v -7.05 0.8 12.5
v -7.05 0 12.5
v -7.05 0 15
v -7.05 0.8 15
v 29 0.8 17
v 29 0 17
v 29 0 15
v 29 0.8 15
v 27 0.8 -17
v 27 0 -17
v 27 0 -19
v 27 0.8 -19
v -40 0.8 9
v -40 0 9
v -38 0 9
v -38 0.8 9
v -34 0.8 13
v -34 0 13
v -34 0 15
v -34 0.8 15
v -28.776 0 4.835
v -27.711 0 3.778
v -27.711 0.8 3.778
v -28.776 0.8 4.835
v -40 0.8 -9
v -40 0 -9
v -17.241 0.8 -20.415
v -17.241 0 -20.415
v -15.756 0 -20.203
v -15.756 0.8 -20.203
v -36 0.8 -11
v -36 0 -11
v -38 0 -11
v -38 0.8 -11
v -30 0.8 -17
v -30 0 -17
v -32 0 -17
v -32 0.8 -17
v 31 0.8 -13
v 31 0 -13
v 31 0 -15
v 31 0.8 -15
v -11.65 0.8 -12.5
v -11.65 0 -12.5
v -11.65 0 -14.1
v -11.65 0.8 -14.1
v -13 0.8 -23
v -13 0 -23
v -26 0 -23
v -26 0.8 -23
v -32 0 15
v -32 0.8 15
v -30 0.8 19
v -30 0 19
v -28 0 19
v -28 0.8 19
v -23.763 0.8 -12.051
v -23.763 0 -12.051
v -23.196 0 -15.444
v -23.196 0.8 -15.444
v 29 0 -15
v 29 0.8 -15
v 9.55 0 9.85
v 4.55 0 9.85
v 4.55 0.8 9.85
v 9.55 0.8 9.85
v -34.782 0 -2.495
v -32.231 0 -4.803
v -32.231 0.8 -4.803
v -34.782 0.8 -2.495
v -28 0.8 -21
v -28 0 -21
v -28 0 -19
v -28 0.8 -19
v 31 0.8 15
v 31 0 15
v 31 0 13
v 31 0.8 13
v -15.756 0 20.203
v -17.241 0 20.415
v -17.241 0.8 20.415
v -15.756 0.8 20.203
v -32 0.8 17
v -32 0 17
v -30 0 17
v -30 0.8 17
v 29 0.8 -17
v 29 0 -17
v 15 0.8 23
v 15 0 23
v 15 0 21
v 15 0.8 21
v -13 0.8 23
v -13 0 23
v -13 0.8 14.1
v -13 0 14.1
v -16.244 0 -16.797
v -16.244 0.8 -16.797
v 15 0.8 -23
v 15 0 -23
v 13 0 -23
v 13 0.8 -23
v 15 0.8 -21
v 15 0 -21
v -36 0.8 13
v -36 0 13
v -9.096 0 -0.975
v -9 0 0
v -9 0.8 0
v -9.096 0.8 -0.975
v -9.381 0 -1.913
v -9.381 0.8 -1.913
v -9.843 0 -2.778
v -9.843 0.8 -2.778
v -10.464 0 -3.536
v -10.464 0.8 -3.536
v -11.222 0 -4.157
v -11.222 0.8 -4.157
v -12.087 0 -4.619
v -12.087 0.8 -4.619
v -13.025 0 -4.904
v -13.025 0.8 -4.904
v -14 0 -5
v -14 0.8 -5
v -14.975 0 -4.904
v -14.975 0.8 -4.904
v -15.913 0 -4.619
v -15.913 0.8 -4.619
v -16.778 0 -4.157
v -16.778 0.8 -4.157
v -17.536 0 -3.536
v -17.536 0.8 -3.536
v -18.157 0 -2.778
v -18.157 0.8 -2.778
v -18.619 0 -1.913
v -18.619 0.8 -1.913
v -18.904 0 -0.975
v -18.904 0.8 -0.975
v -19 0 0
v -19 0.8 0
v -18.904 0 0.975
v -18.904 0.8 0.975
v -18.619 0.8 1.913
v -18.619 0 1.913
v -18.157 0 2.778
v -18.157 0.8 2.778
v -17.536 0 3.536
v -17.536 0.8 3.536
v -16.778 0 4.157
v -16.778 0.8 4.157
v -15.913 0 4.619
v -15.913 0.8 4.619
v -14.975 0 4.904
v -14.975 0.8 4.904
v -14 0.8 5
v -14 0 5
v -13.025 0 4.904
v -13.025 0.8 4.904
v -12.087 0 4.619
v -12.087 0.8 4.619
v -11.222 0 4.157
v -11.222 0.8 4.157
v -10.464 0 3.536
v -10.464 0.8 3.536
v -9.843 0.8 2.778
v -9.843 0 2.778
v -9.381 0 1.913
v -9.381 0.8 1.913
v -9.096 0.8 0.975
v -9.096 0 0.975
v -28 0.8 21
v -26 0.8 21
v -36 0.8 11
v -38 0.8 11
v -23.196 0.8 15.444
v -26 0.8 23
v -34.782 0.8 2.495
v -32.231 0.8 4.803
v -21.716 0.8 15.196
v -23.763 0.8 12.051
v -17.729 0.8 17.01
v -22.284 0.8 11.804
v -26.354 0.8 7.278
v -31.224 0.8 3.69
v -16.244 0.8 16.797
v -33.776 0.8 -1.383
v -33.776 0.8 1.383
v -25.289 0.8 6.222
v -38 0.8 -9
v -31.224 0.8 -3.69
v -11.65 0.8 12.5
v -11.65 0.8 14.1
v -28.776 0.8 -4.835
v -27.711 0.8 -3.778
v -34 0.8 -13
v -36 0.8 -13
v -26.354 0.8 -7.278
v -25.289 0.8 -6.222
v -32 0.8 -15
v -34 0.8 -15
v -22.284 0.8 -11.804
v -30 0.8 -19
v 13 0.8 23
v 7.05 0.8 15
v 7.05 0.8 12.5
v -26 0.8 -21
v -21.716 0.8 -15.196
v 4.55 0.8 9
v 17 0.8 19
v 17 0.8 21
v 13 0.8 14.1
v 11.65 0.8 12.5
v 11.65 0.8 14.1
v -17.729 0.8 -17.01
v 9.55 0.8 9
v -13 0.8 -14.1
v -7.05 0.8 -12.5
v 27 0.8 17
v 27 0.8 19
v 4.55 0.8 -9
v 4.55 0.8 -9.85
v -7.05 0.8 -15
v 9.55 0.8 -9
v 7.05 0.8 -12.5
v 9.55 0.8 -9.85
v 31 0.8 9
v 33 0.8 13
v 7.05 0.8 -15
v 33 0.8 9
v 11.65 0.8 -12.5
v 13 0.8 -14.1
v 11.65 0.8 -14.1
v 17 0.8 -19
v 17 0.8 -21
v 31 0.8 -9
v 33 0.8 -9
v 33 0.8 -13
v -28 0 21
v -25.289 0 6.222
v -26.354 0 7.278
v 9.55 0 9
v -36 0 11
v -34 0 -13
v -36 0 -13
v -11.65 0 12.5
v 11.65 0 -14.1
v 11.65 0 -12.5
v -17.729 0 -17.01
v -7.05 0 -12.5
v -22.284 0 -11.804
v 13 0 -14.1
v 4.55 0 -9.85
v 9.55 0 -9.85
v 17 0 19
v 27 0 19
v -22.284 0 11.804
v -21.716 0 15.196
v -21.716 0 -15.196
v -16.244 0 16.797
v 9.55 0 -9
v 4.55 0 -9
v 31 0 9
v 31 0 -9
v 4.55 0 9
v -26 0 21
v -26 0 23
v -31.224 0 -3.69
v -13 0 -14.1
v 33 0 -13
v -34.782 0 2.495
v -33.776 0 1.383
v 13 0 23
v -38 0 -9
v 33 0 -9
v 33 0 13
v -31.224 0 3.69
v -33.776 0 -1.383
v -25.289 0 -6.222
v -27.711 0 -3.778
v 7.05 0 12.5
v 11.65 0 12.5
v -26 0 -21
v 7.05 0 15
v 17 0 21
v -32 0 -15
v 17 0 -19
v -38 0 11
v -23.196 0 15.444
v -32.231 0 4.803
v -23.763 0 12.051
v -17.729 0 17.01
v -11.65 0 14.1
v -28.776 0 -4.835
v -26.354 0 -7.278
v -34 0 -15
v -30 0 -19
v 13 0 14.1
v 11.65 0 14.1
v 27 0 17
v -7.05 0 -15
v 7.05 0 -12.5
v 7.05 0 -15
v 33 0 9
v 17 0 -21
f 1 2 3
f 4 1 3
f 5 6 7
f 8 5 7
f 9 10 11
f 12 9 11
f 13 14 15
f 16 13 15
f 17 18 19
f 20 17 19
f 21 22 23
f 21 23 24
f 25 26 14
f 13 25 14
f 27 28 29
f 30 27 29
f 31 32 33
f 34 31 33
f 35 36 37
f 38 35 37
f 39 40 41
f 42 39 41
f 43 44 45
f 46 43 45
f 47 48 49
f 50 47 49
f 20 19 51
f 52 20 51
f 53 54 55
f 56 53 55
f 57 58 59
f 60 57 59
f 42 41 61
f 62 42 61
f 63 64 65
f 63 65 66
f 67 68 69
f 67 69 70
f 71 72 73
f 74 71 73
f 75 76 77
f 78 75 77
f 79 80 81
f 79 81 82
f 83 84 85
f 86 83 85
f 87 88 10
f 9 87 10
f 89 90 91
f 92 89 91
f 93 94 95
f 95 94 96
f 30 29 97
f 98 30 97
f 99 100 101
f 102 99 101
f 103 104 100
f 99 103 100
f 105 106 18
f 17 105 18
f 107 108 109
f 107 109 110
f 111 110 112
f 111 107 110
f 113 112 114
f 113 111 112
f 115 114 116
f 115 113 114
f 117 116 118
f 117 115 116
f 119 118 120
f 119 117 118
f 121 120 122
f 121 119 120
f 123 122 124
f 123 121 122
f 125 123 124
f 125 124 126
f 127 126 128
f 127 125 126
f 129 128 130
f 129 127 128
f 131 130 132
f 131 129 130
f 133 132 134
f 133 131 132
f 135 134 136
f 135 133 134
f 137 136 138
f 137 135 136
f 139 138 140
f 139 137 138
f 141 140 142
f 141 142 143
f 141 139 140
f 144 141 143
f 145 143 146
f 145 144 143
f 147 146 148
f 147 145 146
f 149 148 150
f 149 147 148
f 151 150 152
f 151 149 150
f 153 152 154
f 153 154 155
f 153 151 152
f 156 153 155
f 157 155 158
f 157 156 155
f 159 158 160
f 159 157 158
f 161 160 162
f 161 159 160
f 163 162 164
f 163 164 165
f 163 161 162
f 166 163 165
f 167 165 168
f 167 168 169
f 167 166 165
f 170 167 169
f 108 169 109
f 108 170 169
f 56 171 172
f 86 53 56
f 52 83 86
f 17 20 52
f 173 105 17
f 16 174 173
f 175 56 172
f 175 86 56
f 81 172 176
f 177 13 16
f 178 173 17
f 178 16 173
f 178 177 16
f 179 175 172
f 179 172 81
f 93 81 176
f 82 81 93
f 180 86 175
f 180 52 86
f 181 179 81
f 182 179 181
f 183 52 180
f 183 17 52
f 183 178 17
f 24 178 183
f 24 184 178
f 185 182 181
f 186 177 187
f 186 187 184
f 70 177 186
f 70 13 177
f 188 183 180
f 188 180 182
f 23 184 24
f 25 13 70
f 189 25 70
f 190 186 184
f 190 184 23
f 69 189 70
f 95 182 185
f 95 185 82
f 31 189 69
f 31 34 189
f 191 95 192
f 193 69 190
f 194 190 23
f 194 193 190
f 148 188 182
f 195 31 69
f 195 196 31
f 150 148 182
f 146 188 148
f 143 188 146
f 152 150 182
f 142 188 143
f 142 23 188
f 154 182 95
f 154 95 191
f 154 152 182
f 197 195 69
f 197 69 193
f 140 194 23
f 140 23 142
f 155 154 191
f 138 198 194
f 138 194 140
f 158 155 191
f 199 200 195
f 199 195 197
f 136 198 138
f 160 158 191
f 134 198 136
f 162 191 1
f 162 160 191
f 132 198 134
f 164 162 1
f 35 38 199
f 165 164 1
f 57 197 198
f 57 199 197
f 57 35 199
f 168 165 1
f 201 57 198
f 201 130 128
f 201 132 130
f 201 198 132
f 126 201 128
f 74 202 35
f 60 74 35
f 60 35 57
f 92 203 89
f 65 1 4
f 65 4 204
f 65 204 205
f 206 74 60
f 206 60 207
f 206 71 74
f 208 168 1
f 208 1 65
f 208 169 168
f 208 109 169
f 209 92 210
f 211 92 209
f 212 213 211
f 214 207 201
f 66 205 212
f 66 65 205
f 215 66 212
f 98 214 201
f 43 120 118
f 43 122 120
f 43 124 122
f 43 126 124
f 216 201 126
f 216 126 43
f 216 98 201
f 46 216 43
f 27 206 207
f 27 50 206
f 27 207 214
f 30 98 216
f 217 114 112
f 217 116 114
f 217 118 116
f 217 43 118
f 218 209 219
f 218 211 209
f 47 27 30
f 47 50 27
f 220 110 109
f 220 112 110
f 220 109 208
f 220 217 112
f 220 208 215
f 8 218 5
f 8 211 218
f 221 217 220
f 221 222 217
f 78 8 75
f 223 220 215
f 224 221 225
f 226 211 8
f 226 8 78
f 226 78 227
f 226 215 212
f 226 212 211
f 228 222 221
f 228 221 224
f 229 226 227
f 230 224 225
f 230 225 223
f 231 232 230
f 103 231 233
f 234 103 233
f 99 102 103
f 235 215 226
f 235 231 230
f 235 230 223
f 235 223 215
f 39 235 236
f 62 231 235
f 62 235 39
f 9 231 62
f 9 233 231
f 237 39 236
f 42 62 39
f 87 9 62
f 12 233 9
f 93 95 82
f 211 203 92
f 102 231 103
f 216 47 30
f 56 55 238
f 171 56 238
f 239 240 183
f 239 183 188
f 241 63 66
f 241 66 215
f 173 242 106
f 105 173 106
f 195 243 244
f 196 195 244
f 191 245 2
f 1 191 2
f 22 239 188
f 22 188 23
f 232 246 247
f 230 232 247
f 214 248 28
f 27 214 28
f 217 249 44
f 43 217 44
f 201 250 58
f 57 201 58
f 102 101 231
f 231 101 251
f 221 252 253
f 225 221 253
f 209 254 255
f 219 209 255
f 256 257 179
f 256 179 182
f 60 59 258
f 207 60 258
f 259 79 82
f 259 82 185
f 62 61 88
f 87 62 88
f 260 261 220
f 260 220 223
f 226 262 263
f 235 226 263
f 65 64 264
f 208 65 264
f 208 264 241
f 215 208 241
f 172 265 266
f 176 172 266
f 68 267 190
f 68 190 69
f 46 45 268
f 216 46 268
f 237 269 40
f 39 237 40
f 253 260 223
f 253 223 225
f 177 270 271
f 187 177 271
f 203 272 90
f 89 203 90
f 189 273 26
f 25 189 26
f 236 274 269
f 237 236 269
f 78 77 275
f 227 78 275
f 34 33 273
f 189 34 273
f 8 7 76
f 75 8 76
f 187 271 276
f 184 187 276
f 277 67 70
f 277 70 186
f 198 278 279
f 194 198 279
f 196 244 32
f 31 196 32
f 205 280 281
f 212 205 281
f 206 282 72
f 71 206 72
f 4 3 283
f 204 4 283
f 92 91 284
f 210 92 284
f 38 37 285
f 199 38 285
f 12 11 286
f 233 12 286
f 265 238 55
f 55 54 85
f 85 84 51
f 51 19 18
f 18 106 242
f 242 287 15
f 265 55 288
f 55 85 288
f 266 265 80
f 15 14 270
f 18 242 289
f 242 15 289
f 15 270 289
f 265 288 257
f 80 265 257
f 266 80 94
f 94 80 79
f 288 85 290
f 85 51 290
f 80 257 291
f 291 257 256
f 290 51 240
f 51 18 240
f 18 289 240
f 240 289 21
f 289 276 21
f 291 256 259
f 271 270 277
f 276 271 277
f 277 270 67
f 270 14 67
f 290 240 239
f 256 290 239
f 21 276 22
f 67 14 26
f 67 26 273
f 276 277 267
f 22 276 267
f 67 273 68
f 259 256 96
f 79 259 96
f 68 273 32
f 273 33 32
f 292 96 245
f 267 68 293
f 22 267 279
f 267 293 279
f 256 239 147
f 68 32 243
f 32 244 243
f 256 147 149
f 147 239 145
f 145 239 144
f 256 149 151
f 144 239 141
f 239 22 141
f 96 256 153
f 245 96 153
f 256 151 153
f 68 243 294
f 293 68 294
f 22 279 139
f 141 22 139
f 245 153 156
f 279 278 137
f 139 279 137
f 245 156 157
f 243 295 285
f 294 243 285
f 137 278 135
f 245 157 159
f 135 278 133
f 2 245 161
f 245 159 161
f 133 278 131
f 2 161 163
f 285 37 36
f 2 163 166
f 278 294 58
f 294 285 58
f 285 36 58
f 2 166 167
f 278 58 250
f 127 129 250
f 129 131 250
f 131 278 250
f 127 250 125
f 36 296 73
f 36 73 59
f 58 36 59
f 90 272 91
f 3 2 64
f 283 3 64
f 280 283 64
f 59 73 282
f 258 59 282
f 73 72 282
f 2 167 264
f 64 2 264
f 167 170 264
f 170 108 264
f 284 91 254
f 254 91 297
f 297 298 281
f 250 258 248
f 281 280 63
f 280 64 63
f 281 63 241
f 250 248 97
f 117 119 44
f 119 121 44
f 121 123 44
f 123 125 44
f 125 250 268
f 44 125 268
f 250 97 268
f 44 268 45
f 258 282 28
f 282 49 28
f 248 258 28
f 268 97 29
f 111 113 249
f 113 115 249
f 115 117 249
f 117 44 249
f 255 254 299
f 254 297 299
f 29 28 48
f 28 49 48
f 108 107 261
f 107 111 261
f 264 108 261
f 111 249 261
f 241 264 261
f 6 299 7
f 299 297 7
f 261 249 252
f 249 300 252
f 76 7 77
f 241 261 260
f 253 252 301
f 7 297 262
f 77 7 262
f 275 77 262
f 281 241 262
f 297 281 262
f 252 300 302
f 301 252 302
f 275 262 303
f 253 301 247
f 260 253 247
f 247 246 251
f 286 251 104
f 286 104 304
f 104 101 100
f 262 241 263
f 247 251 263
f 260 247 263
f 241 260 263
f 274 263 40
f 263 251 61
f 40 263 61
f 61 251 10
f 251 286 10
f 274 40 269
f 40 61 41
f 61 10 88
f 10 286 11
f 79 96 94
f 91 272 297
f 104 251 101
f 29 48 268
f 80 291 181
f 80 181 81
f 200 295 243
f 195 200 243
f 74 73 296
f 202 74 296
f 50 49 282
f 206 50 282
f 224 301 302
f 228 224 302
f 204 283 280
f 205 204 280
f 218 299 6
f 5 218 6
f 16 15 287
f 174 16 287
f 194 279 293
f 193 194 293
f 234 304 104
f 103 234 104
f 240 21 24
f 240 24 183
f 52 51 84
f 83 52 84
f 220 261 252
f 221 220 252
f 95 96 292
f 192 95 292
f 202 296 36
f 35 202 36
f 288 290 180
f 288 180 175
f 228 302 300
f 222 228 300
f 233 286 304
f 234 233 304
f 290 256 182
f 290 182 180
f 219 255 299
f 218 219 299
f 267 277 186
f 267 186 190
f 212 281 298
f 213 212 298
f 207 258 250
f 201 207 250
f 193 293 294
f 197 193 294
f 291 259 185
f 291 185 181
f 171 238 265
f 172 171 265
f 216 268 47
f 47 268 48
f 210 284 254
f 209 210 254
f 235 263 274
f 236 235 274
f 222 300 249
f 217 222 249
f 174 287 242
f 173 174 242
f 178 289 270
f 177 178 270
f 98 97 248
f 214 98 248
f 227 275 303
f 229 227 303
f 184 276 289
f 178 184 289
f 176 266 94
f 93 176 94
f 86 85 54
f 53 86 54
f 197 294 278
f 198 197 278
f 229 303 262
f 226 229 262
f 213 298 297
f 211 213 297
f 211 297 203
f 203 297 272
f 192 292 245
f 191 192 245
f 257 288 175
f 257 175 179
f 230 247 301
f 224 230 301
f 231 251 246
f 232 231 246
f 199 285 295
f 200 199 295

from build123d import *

# Parameters (mm, degrees)
SKETCH_5_R      = 5
SKETCH_5_W      = 5
SKETCH_5_H      = 0.85
EXTRUDE_1_DEPTH = 0.8


with BuildPart() as part:
    # 스케치5 → 보스-돌출1 (new body)
    with BuildSketch(Plane(origin=(0, 0, 0), x_dir=(1, 0, 0), z_dir=(0, 1, 0))):
        Polygon((-13, -23), (-13, -14.1), (-11.65, -14.1), (-11.65, -12.5), (-7.05, -12.5), (-7.05, -14.1), (-7.05, -15), (7.05, -15), (7.05, -14.1), (7.05, -12.5), (11.65, -12.5), (11.65, -14.1), (13, -14.1), (13, -23), (15, -23), (15, -21), (17, -21), (17, -19), (27, -19), (27, -17), (29, -17), (29, -15), (31, -15), (31, -13), (33, -13), (33, -9), (31, -9), (31, 9), (33, 9), (33, 13), (31, 13), (31, 15), (29, 15), (29, 17), (27, 17), (27, 19), (17, 19), (17, 21), (15, 21), (15, 23), (13, 23), (13, 14.1), (11.65, 14.1), (11.65, 12.5), (7.05, 12.5), (7.05, 14.1), (7.05, 15), (-7.05, 15), (-7.05, 14.1), (-7.05, 12.5), (-11.65, 12.5), (-11.65, 14.1), (-13, 14.1), (-13, 23), (-26, 23), (-26, 21), (-28, 21), (-28, 19), (-30, 19), (-30, 17), (-32, 17), (-32, 15), (-34, 15), (-34, 13), (-36, 13), (-36, 11), (-38, 11), (-38, 9), (-40, 9), (-40, -9), (-38, -9), (-38, -11), (-36, -11), (-36, -13), (-34, -13), (-34, -15), (-32, -15), (-32, -17), (-30, -17), (-30, -19), (-28, -19), (-28, -21), (-26, -21), (-26, -23), align=None)
        with Locations((-14, 0)):
            Circle(SKETCH_5_R, mode=Mode.SUBTRACT)
        Polygon((-17.728524487, -17.009831185), (-17.241222705, -20.415141299), (-15.756349109, -20.202655057), (-16.243650891, -16.797344943), align=None, mode=Mode.SUBTRACT)
        Polygon((-23.763263852, -12.051103665), (-23.19560882, -15.443944328), (-21.716172484, -15.196420332), (-22.283827516, -11.803579668), align=None, mode=Mode.SUBTRACT)
        Polygon((-28.776184385, -4.834516937), (-26.354359033, -7.277540056), (-25.289087324, -6.22151156), (-27.710912676, -3.77848844), align=None, mode=Mode.SUBTRACT)
        Polygon((-32.230719309, -4.802671603), (-34.781815362, -2.494965181), (-33.775548026, -1.382568646), (-31.224451974, -3.690275068), align=None, mode=Mode.SUBTRACT)
        Polygon((-17.241222705, 20.415141299), (-15.756349109, 20.202655057), (-16.243650891, 16.797344943), (-17.728524487, 17.009831185), align=None, mode=Mode.SUBTRACT)
        Polygon((-23.19560882, 15.443944328), (-21.716172484, 15.196420332), (-22.283827516, 11.803579668), (-23.763263852, 12.051103665), align=None, mode=Mode.SUBTRACT)
        Polygon((-26.354359033, 7.277540056), (-25.289087324, 6.22151156), (-27.710912676, 3.77848844), (-28.776184385, 4.834516937), align=None, mode=Mode.SUBTRACT)
        Polygon((-34.781815362, 2.494965181), (-33.775548026, 1.382568646), (-31.224451974, 3.690275068), (-32.230719309, 4.802671603), align=None, mode=Mode.SUBTRACT)
        with Locations((7.05, 9.425)):
            Rectangle(SKETCH_5_W, SKETCH_5_H, mode=Mode.SUBTRACT)
        with Locations((7.05, -9.425)):
            Rectangle(SKETCH_5_W, SKETCH_5_H, mode=Mode.SUBTRACT)
    extrude(amount=EXTRUDE_1_DEPTH)


solid = part.part
